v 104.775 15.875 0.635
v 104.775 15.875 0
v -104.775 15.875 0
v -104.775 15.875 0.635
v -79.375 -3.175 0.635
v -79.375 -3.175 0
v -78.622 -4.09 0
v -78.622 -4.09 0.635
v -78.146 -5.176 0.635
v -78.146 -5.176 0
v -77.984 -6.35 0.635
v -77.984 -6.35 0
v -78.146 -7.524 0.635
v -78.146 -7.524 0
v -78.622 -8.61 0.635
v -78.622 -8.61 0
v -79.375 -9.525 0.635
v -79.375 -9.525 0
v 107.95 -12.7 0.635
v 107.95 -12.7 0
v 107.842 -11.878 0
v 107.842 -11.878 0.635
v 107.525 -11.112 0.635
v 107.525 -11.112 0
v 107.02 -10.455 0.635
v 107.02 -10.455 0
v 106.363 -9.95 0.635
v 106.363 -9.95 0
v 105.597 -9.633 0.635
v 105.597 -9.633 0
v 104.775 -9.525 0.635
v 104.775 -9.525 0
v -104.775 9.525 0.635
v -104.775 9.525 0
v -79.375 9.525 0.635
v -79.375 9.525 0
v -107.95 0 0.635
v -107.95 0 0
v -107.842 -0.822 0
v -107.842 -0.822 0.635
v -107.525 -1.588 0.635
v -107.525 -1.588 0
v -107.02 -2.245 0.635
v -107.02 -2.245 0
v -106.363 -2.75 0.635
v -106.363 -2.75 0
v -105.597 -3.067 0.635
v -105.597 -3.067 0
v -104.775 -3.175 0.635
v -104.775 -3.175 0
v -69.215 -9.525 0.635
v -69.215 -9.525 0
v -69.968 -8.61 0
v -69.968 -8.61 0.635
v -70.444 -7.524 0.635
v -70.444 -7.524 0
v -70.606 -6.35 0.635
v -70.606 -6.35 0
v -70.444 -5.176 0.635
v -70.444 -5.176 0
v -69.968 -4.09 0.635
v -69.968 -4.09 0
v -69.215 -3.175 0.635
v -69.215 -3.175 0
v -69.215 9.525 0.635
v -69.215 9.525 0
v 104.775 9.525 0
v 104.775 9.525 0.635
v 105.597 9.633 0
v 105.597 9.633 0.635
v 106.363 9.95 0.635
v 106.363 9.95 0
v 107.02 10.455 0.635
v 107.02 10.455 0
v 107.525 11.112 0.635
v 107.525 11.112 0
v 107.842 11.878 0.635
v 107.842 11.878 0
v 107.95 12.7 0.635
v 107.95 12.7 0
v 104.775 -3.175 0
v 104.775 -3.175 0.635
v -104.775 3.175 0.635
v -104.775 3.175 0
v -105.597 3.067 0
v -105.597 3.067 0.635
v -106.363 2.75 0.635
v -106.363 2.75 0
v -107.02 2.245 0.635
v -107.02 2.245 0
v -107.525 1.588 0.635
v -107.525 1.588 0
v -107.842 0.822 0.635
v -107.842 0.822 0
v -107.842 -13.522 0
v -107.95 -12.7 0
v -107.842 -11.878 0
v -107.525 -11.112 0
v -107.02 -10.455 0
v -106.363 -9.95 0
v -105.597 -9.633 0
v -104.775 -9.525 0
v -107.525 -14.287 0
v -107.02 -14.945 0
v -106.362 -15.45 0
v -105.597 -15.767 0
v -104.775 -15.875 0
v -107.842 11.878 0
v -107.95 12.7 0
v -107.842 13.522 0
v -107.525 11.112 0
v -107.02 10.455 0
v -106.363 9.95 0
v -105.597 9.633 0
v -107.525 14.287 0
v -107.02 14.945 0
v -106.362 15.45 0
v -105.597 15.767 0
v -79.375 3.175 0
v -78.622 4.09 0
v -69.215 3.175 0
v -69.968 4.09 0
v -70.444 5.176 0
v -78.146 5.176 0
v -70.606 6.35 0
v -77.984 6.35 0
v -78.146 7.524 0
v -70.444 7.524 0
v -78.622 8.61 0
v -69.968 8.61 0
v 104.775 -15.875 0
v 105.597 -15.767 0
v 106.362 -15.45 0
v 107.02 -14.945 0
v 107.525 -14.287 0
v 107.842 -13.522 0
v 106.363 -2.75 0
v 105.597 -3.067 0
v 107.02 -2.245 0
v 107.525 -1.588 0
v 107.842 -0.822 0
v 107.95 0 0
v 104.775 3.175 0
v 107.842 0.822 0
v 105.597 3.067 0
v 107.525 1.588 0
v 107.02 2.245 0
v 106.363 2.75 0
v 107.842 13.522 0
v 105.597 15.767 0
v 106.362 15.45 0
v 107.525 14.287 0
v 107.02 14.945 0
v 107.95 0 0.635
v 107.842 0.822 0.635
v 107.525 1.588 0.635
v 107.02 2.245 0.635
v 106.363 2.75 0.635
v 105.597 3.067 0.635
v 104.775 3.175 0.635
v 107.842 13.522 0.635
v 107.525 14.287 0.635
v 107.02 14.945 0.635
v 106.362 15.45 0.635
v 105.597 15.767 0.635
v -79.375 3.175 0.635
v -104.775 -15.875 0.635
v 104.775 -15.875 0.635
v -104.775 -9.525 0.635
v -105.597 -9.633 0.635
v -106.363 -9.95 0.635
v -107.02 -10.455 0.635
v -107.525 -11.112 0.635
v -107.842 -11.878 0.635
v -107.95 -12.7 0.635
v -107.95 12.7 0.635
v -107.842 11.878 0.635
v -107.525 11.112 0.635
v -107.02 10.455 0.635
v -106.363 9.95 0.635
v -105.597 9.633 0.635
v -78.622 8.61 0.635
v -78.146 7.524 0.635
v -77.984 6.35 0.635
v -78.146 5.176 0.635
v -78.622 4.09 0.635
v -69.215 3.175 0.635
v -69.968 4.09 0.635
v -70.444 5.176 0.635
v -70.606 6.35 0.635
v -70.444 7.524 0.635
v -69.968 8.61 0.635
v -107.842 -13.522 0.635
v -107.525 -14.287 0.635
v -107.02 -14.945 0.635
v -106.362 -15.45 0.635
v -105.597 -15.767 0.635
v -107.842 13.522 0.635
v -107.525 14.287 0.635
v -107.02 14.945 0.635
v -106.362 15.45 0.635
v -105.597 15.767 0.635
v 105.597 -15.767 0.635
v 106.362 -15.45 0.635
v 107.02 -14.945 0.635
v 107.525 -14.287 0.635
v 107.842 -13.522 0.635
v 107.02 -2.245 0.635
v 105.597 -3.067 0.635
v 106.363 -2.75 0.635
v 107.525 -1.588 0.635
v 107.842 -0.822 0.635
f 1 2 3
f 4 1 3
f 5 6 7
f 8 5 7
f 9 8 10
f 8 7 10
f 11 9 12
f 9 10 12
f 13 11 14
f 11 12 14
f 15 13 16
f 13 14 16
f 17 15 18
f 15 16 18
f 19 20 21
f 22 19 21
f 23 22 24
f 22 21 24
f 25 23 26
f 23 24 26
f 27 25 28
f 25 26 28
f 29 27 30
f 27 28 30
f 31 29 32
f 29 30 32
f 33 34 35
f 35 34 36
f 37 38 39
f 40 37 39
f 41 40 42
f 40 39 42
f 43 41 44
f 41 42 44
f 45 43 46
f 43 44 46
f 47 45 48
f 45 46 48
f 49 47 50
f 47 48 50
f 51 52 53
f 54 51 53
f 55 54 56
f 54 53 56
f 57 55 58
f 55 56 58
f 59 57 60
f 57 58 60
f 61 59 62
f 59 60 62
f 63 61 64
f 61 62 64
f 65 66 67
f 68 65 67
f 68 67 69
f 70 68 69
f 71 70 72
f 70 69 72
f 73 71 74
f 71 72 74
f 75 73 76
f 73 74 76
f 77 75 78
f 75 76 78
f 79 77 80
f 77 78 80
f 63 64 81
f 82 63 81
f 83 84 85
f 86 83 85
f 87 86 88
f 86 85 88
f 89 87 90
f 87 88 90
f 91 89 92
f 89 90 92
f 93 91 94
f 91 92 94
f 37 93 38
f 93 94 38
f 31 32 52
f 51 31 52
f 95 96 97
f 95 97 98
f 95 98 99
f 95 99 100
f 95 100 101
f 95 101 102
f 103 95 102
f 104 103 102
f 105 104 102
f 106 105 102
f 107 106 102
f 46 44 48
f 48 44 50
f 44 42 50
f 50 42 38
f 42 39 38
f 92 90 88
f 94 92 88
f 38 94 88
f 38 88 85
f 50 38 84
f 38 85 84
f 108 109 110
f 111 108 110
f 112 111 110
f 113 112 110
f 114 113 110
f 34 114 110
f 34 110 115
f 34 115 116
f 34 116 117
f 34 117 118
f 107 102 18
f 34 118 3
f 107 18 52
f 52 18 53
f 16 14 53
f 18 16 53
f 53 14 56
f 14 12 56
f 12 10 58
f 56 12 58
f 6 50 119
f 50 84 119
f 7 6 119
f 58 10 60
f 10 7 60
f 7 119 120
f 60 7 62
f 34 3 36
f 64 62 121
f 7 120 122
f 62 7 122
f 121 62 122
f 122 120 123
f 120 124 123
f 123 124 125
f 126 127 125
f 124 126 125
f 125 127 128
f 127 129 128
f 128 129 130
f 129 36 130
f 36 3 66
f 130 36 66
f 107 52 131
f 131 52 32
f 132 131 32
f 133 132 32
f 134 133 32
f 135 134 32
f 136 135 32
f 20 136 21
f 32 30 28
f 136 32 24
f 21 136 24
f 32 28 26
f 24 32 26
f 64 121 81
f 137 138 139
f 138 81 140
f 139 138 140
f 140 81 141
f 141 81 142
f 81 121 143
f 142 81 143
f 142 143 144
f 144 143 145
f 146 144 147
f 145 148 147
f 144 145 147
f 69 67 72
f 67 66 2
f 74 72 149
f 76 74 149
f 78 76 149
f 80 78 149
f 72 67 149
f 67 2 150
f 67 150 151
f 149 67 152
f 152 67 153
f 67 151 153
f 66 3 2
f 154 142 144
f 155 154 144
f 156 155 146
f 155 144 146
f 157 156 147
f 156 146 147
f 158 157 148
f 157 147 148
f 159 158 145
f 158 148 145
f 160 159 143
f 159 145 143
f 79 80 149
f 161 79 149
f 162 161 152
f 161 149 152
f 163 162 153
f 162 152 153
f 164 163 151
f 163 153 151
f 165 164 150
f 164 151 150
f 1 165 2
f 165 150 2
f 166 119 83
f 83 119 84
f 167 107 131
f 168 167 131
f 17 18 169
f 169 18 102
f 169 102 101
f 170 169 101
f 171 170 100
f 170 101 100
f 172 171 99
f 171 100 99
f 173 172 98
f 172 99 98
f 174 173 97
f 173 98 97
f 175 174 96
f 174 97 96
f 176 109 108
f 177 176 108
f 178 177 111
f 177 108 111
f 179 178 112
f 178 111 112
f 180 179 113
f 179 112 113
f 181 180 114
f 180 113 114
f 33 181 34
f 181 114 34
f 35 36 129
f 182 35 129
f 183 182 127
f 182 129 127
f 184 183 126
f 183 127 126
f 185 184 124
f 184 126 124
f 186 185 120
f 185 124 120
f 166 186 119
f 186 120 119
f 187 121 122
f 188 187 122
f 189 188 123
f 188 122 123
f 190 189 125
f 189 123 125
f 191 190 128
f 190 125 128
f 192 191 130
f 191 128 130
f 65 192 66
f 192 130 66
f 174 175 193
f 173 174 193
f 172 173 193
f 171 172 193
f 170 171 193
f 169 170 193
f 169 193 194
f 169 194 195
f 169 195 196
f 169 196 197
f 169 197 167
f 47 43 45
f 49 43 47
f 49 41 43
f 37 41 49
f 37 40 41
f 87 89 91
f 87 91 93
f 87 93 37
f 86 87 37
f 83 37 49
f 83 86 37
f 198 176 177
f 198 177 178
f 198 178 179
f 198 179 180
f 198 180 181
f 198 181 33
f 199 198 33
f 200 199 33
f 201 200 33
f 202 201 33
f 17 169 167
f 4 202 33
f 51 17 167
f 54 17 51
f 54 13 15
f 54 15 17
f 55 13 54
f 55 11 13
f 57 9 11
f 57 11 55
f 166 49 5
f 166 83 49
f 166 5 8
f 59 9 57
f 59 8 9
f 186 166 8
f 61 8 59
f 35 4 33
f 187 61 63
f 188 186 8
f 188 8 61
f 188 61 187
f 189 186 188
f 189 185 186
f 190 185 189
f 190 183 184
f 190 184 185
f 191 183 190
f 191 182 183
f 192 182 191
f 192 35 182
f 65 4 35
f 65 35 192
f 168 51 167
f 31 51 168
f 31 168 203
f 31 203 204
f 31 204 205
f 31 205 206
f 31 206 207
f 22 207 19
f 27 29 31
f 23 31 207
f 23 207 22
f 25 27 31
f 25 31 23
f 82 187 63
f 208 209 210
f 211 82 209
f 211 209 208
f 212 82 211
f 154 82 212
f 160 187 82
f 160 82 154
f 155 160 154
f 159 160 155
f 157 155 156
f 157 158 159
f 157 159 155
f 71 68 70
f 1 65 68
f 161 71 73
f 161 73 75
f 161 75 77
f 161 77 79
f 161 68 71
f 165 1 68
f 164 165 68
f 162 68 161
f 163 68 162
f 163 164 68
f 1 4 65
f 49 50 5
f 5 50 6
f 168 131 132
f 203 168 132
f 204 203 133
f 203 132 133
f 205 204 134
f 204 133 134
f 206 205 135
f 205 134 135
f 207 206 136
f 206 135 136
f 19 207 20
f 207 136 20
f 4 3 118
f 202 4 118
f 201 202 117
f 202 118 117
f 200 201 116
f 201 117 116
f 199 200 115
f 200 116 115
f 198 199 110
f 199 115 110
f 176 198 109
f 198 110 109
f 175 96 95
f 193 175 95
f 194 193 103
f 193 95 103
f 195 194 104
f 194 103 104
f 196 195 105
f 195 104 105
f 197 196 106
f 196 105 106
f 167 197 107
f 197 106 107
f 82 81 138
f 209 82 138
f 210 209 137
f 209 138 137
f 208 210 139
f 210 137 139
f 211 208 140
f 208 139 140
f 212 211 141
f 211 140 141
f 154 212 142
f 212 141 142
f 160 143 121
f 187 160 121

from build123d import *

# Parameters (mm, degrees)
F1_DEPTH = 0.635


# Not quite as in the source:
# - a feature names something its author has since deleted; it is built from what else it names


with BuildPart() as f1:
    # F0 (on Top) → F1 (new body)
    with BuildSketch(Plane.XY):
        with BuildLine():
            ThreePointArc((107.95, 0), (107.0200640303, 2.2450640303), (104.775, 3.175))
            Line((104.775, 3.175), (-69.215, 3.175))
            Line((-69.215, 3.175), (-74.295, 3.175))
            Line((-74.295, 3.175), (-74.295, -3.175))
            Line((-74.295, -3.175), (-69.215, -3.175))
            Line((-69.215, -3.175), (104.775, -3.175))
            ThreePointArc((104.775, -3.175), (107.0200640303, -2.2450640303), (107.95, 0))
        make_face()
        with BuildLine():
            Line((-74.295, -3.175), (-74.295, 3.175))
            Line((-74.295, 3.175), (-79.375, 3.175))
            Line((-79.375, 3.175), (-104.775, 3.175))
            ThreePointArc((-104.775, 3.175), (-107.0200640303, 2.2450640303), (-107.95, 0))
            ThreePointArc((-107.95, 0), (-107.0200640303, -2.2450640303), (-104.775, -3.175))
            Line((-104.775, -3.175), (-79.375, -3.175))
            Line((-79.375, -3.175), (-74.295, -3.175))
        make_face()
        with BuildLine():
            Line((-74.295, 9.525), (-69.215, 9.525))
            Line((-69.215, 9.525), (104.775, 9.525))
            ThreePointArc((104.775, 9.525), (107.0200640303, 10.4549359697), (107.95, 12.7))
            ThreePointArc((107.95, 12.7), (107.0200640302, 14.9450640302), (104.775, 15.875))
            Line((104.775, 15.875), (-74.295, 15.875))
            Line((-74.295, 15.875), (-74.295, 9.525))
        make_face()
        with BuildLine():
            Line((-79.375, 9.525), (-74.295, 9.525))
            Line((-74.295, 9.525), (-74.295, 15.875))
            Line((-74.295, 15.875), (-104.775, 15.875))
            ThreePointArc((-104.775, 15.875), (-107.0200640302, 14.9450640302), (-107.95, 12.7))
            ThreePointArc((-107.95, 12.7), (-107.0200640303, 10.4549359697), (-104.775, 9.525))
            Line((-104.775, 9.525), (-79.375, 9.525))
        make_face()
        with BuildLine():
            Line((-69.2150000001, -9.5250000001), (-74.295, -9.5250000001))
            Line((-74.295, -9.5250000001), (-74.295, -15.875))
            Line((-74.295, -15.875), (104.775, -15.875))
            ThreePointArc((104.775, -15.875), (107.0200640302, -14.9450640302), (107.95, -12.7))
            ThreePointArc((107.95, -12.7), (107.0200640303, -10.4549359697), (104.775, -9.525))
            Line((104.775, -9.5250000001), (-69.2150000001, -9.5250000001))
        make_face()
        with BuildLine():
            Line((-74.295, -15.875), (-74.295, -9.5250000001))
            Line((-74.295, -9.5250000001), (-79.375, -9.5250000001))
            Line((-79.375, -9.5250000001), (-104.775, -9.5250000001))
            ThreePointArc((-104.775, -9.525), (-107.0200640303, -10.4549359697), (-107.95, -12.7))
            ThreePointArc((-107.95, -12.7), (-107.0200640302, -14.9450640302), (-104.775, -15.875))
            Line((-104.775, -15.875), (-74.295, -15.875))
        make_face()
        with BuildLine():
            Line((-79.375, 3.175), (-74.295, 3.175))
            Line((-74.295, 3.175), (-74.295, 9.525))
            Line((-74.295, 9.525), (-79.375, 9.525))
            ThreePointArc((-79.375, 9.525), (-77.98351653, 6.35), (-79.375, 3.175))
        make_face()
        with BuildLine():
            Line((-74.295, 3.175), (-69.215, 3.175))
            ThreePointArc((-69.215, 3.175), (-70.6064834701, 6.35), (-69.215, 9.525))
            Line((-69.215, 9.525), (-74.295, 9.525))
            Line((-74.295, 9.525), (-74.295, 3.175))
        make_face()
        with BuildLine():
            Line((-74.295, -9.5250000001), (-74.295, -3.175))
            Line((-74.295, -3.175), (-79.375, -3.175))
            ThreePointArc((-79.375, -3.175), (-77.9835165299, -6.35), (-79.375, -9.525))
            Line((-79.375, -9.5250000001), (-74.295, -9.5250000001))
        make_face()
        with BuildLine():
            Line((-69.215, -3.175), (-74.295, -3.175))
            Line((-74.295, -3.175), (-74.295, -9.5250000001))
            Line((-74.295, -9.5250000001), (-69.2150000001, -9.5250000001))
            ThreePointArc((-69.2150000001, -9.525), (-70.6064834702, -6.35), (-69.215, -3.175))
        make_face()
    extrude(amount=F1_DEPTH)


solid = f1.part
